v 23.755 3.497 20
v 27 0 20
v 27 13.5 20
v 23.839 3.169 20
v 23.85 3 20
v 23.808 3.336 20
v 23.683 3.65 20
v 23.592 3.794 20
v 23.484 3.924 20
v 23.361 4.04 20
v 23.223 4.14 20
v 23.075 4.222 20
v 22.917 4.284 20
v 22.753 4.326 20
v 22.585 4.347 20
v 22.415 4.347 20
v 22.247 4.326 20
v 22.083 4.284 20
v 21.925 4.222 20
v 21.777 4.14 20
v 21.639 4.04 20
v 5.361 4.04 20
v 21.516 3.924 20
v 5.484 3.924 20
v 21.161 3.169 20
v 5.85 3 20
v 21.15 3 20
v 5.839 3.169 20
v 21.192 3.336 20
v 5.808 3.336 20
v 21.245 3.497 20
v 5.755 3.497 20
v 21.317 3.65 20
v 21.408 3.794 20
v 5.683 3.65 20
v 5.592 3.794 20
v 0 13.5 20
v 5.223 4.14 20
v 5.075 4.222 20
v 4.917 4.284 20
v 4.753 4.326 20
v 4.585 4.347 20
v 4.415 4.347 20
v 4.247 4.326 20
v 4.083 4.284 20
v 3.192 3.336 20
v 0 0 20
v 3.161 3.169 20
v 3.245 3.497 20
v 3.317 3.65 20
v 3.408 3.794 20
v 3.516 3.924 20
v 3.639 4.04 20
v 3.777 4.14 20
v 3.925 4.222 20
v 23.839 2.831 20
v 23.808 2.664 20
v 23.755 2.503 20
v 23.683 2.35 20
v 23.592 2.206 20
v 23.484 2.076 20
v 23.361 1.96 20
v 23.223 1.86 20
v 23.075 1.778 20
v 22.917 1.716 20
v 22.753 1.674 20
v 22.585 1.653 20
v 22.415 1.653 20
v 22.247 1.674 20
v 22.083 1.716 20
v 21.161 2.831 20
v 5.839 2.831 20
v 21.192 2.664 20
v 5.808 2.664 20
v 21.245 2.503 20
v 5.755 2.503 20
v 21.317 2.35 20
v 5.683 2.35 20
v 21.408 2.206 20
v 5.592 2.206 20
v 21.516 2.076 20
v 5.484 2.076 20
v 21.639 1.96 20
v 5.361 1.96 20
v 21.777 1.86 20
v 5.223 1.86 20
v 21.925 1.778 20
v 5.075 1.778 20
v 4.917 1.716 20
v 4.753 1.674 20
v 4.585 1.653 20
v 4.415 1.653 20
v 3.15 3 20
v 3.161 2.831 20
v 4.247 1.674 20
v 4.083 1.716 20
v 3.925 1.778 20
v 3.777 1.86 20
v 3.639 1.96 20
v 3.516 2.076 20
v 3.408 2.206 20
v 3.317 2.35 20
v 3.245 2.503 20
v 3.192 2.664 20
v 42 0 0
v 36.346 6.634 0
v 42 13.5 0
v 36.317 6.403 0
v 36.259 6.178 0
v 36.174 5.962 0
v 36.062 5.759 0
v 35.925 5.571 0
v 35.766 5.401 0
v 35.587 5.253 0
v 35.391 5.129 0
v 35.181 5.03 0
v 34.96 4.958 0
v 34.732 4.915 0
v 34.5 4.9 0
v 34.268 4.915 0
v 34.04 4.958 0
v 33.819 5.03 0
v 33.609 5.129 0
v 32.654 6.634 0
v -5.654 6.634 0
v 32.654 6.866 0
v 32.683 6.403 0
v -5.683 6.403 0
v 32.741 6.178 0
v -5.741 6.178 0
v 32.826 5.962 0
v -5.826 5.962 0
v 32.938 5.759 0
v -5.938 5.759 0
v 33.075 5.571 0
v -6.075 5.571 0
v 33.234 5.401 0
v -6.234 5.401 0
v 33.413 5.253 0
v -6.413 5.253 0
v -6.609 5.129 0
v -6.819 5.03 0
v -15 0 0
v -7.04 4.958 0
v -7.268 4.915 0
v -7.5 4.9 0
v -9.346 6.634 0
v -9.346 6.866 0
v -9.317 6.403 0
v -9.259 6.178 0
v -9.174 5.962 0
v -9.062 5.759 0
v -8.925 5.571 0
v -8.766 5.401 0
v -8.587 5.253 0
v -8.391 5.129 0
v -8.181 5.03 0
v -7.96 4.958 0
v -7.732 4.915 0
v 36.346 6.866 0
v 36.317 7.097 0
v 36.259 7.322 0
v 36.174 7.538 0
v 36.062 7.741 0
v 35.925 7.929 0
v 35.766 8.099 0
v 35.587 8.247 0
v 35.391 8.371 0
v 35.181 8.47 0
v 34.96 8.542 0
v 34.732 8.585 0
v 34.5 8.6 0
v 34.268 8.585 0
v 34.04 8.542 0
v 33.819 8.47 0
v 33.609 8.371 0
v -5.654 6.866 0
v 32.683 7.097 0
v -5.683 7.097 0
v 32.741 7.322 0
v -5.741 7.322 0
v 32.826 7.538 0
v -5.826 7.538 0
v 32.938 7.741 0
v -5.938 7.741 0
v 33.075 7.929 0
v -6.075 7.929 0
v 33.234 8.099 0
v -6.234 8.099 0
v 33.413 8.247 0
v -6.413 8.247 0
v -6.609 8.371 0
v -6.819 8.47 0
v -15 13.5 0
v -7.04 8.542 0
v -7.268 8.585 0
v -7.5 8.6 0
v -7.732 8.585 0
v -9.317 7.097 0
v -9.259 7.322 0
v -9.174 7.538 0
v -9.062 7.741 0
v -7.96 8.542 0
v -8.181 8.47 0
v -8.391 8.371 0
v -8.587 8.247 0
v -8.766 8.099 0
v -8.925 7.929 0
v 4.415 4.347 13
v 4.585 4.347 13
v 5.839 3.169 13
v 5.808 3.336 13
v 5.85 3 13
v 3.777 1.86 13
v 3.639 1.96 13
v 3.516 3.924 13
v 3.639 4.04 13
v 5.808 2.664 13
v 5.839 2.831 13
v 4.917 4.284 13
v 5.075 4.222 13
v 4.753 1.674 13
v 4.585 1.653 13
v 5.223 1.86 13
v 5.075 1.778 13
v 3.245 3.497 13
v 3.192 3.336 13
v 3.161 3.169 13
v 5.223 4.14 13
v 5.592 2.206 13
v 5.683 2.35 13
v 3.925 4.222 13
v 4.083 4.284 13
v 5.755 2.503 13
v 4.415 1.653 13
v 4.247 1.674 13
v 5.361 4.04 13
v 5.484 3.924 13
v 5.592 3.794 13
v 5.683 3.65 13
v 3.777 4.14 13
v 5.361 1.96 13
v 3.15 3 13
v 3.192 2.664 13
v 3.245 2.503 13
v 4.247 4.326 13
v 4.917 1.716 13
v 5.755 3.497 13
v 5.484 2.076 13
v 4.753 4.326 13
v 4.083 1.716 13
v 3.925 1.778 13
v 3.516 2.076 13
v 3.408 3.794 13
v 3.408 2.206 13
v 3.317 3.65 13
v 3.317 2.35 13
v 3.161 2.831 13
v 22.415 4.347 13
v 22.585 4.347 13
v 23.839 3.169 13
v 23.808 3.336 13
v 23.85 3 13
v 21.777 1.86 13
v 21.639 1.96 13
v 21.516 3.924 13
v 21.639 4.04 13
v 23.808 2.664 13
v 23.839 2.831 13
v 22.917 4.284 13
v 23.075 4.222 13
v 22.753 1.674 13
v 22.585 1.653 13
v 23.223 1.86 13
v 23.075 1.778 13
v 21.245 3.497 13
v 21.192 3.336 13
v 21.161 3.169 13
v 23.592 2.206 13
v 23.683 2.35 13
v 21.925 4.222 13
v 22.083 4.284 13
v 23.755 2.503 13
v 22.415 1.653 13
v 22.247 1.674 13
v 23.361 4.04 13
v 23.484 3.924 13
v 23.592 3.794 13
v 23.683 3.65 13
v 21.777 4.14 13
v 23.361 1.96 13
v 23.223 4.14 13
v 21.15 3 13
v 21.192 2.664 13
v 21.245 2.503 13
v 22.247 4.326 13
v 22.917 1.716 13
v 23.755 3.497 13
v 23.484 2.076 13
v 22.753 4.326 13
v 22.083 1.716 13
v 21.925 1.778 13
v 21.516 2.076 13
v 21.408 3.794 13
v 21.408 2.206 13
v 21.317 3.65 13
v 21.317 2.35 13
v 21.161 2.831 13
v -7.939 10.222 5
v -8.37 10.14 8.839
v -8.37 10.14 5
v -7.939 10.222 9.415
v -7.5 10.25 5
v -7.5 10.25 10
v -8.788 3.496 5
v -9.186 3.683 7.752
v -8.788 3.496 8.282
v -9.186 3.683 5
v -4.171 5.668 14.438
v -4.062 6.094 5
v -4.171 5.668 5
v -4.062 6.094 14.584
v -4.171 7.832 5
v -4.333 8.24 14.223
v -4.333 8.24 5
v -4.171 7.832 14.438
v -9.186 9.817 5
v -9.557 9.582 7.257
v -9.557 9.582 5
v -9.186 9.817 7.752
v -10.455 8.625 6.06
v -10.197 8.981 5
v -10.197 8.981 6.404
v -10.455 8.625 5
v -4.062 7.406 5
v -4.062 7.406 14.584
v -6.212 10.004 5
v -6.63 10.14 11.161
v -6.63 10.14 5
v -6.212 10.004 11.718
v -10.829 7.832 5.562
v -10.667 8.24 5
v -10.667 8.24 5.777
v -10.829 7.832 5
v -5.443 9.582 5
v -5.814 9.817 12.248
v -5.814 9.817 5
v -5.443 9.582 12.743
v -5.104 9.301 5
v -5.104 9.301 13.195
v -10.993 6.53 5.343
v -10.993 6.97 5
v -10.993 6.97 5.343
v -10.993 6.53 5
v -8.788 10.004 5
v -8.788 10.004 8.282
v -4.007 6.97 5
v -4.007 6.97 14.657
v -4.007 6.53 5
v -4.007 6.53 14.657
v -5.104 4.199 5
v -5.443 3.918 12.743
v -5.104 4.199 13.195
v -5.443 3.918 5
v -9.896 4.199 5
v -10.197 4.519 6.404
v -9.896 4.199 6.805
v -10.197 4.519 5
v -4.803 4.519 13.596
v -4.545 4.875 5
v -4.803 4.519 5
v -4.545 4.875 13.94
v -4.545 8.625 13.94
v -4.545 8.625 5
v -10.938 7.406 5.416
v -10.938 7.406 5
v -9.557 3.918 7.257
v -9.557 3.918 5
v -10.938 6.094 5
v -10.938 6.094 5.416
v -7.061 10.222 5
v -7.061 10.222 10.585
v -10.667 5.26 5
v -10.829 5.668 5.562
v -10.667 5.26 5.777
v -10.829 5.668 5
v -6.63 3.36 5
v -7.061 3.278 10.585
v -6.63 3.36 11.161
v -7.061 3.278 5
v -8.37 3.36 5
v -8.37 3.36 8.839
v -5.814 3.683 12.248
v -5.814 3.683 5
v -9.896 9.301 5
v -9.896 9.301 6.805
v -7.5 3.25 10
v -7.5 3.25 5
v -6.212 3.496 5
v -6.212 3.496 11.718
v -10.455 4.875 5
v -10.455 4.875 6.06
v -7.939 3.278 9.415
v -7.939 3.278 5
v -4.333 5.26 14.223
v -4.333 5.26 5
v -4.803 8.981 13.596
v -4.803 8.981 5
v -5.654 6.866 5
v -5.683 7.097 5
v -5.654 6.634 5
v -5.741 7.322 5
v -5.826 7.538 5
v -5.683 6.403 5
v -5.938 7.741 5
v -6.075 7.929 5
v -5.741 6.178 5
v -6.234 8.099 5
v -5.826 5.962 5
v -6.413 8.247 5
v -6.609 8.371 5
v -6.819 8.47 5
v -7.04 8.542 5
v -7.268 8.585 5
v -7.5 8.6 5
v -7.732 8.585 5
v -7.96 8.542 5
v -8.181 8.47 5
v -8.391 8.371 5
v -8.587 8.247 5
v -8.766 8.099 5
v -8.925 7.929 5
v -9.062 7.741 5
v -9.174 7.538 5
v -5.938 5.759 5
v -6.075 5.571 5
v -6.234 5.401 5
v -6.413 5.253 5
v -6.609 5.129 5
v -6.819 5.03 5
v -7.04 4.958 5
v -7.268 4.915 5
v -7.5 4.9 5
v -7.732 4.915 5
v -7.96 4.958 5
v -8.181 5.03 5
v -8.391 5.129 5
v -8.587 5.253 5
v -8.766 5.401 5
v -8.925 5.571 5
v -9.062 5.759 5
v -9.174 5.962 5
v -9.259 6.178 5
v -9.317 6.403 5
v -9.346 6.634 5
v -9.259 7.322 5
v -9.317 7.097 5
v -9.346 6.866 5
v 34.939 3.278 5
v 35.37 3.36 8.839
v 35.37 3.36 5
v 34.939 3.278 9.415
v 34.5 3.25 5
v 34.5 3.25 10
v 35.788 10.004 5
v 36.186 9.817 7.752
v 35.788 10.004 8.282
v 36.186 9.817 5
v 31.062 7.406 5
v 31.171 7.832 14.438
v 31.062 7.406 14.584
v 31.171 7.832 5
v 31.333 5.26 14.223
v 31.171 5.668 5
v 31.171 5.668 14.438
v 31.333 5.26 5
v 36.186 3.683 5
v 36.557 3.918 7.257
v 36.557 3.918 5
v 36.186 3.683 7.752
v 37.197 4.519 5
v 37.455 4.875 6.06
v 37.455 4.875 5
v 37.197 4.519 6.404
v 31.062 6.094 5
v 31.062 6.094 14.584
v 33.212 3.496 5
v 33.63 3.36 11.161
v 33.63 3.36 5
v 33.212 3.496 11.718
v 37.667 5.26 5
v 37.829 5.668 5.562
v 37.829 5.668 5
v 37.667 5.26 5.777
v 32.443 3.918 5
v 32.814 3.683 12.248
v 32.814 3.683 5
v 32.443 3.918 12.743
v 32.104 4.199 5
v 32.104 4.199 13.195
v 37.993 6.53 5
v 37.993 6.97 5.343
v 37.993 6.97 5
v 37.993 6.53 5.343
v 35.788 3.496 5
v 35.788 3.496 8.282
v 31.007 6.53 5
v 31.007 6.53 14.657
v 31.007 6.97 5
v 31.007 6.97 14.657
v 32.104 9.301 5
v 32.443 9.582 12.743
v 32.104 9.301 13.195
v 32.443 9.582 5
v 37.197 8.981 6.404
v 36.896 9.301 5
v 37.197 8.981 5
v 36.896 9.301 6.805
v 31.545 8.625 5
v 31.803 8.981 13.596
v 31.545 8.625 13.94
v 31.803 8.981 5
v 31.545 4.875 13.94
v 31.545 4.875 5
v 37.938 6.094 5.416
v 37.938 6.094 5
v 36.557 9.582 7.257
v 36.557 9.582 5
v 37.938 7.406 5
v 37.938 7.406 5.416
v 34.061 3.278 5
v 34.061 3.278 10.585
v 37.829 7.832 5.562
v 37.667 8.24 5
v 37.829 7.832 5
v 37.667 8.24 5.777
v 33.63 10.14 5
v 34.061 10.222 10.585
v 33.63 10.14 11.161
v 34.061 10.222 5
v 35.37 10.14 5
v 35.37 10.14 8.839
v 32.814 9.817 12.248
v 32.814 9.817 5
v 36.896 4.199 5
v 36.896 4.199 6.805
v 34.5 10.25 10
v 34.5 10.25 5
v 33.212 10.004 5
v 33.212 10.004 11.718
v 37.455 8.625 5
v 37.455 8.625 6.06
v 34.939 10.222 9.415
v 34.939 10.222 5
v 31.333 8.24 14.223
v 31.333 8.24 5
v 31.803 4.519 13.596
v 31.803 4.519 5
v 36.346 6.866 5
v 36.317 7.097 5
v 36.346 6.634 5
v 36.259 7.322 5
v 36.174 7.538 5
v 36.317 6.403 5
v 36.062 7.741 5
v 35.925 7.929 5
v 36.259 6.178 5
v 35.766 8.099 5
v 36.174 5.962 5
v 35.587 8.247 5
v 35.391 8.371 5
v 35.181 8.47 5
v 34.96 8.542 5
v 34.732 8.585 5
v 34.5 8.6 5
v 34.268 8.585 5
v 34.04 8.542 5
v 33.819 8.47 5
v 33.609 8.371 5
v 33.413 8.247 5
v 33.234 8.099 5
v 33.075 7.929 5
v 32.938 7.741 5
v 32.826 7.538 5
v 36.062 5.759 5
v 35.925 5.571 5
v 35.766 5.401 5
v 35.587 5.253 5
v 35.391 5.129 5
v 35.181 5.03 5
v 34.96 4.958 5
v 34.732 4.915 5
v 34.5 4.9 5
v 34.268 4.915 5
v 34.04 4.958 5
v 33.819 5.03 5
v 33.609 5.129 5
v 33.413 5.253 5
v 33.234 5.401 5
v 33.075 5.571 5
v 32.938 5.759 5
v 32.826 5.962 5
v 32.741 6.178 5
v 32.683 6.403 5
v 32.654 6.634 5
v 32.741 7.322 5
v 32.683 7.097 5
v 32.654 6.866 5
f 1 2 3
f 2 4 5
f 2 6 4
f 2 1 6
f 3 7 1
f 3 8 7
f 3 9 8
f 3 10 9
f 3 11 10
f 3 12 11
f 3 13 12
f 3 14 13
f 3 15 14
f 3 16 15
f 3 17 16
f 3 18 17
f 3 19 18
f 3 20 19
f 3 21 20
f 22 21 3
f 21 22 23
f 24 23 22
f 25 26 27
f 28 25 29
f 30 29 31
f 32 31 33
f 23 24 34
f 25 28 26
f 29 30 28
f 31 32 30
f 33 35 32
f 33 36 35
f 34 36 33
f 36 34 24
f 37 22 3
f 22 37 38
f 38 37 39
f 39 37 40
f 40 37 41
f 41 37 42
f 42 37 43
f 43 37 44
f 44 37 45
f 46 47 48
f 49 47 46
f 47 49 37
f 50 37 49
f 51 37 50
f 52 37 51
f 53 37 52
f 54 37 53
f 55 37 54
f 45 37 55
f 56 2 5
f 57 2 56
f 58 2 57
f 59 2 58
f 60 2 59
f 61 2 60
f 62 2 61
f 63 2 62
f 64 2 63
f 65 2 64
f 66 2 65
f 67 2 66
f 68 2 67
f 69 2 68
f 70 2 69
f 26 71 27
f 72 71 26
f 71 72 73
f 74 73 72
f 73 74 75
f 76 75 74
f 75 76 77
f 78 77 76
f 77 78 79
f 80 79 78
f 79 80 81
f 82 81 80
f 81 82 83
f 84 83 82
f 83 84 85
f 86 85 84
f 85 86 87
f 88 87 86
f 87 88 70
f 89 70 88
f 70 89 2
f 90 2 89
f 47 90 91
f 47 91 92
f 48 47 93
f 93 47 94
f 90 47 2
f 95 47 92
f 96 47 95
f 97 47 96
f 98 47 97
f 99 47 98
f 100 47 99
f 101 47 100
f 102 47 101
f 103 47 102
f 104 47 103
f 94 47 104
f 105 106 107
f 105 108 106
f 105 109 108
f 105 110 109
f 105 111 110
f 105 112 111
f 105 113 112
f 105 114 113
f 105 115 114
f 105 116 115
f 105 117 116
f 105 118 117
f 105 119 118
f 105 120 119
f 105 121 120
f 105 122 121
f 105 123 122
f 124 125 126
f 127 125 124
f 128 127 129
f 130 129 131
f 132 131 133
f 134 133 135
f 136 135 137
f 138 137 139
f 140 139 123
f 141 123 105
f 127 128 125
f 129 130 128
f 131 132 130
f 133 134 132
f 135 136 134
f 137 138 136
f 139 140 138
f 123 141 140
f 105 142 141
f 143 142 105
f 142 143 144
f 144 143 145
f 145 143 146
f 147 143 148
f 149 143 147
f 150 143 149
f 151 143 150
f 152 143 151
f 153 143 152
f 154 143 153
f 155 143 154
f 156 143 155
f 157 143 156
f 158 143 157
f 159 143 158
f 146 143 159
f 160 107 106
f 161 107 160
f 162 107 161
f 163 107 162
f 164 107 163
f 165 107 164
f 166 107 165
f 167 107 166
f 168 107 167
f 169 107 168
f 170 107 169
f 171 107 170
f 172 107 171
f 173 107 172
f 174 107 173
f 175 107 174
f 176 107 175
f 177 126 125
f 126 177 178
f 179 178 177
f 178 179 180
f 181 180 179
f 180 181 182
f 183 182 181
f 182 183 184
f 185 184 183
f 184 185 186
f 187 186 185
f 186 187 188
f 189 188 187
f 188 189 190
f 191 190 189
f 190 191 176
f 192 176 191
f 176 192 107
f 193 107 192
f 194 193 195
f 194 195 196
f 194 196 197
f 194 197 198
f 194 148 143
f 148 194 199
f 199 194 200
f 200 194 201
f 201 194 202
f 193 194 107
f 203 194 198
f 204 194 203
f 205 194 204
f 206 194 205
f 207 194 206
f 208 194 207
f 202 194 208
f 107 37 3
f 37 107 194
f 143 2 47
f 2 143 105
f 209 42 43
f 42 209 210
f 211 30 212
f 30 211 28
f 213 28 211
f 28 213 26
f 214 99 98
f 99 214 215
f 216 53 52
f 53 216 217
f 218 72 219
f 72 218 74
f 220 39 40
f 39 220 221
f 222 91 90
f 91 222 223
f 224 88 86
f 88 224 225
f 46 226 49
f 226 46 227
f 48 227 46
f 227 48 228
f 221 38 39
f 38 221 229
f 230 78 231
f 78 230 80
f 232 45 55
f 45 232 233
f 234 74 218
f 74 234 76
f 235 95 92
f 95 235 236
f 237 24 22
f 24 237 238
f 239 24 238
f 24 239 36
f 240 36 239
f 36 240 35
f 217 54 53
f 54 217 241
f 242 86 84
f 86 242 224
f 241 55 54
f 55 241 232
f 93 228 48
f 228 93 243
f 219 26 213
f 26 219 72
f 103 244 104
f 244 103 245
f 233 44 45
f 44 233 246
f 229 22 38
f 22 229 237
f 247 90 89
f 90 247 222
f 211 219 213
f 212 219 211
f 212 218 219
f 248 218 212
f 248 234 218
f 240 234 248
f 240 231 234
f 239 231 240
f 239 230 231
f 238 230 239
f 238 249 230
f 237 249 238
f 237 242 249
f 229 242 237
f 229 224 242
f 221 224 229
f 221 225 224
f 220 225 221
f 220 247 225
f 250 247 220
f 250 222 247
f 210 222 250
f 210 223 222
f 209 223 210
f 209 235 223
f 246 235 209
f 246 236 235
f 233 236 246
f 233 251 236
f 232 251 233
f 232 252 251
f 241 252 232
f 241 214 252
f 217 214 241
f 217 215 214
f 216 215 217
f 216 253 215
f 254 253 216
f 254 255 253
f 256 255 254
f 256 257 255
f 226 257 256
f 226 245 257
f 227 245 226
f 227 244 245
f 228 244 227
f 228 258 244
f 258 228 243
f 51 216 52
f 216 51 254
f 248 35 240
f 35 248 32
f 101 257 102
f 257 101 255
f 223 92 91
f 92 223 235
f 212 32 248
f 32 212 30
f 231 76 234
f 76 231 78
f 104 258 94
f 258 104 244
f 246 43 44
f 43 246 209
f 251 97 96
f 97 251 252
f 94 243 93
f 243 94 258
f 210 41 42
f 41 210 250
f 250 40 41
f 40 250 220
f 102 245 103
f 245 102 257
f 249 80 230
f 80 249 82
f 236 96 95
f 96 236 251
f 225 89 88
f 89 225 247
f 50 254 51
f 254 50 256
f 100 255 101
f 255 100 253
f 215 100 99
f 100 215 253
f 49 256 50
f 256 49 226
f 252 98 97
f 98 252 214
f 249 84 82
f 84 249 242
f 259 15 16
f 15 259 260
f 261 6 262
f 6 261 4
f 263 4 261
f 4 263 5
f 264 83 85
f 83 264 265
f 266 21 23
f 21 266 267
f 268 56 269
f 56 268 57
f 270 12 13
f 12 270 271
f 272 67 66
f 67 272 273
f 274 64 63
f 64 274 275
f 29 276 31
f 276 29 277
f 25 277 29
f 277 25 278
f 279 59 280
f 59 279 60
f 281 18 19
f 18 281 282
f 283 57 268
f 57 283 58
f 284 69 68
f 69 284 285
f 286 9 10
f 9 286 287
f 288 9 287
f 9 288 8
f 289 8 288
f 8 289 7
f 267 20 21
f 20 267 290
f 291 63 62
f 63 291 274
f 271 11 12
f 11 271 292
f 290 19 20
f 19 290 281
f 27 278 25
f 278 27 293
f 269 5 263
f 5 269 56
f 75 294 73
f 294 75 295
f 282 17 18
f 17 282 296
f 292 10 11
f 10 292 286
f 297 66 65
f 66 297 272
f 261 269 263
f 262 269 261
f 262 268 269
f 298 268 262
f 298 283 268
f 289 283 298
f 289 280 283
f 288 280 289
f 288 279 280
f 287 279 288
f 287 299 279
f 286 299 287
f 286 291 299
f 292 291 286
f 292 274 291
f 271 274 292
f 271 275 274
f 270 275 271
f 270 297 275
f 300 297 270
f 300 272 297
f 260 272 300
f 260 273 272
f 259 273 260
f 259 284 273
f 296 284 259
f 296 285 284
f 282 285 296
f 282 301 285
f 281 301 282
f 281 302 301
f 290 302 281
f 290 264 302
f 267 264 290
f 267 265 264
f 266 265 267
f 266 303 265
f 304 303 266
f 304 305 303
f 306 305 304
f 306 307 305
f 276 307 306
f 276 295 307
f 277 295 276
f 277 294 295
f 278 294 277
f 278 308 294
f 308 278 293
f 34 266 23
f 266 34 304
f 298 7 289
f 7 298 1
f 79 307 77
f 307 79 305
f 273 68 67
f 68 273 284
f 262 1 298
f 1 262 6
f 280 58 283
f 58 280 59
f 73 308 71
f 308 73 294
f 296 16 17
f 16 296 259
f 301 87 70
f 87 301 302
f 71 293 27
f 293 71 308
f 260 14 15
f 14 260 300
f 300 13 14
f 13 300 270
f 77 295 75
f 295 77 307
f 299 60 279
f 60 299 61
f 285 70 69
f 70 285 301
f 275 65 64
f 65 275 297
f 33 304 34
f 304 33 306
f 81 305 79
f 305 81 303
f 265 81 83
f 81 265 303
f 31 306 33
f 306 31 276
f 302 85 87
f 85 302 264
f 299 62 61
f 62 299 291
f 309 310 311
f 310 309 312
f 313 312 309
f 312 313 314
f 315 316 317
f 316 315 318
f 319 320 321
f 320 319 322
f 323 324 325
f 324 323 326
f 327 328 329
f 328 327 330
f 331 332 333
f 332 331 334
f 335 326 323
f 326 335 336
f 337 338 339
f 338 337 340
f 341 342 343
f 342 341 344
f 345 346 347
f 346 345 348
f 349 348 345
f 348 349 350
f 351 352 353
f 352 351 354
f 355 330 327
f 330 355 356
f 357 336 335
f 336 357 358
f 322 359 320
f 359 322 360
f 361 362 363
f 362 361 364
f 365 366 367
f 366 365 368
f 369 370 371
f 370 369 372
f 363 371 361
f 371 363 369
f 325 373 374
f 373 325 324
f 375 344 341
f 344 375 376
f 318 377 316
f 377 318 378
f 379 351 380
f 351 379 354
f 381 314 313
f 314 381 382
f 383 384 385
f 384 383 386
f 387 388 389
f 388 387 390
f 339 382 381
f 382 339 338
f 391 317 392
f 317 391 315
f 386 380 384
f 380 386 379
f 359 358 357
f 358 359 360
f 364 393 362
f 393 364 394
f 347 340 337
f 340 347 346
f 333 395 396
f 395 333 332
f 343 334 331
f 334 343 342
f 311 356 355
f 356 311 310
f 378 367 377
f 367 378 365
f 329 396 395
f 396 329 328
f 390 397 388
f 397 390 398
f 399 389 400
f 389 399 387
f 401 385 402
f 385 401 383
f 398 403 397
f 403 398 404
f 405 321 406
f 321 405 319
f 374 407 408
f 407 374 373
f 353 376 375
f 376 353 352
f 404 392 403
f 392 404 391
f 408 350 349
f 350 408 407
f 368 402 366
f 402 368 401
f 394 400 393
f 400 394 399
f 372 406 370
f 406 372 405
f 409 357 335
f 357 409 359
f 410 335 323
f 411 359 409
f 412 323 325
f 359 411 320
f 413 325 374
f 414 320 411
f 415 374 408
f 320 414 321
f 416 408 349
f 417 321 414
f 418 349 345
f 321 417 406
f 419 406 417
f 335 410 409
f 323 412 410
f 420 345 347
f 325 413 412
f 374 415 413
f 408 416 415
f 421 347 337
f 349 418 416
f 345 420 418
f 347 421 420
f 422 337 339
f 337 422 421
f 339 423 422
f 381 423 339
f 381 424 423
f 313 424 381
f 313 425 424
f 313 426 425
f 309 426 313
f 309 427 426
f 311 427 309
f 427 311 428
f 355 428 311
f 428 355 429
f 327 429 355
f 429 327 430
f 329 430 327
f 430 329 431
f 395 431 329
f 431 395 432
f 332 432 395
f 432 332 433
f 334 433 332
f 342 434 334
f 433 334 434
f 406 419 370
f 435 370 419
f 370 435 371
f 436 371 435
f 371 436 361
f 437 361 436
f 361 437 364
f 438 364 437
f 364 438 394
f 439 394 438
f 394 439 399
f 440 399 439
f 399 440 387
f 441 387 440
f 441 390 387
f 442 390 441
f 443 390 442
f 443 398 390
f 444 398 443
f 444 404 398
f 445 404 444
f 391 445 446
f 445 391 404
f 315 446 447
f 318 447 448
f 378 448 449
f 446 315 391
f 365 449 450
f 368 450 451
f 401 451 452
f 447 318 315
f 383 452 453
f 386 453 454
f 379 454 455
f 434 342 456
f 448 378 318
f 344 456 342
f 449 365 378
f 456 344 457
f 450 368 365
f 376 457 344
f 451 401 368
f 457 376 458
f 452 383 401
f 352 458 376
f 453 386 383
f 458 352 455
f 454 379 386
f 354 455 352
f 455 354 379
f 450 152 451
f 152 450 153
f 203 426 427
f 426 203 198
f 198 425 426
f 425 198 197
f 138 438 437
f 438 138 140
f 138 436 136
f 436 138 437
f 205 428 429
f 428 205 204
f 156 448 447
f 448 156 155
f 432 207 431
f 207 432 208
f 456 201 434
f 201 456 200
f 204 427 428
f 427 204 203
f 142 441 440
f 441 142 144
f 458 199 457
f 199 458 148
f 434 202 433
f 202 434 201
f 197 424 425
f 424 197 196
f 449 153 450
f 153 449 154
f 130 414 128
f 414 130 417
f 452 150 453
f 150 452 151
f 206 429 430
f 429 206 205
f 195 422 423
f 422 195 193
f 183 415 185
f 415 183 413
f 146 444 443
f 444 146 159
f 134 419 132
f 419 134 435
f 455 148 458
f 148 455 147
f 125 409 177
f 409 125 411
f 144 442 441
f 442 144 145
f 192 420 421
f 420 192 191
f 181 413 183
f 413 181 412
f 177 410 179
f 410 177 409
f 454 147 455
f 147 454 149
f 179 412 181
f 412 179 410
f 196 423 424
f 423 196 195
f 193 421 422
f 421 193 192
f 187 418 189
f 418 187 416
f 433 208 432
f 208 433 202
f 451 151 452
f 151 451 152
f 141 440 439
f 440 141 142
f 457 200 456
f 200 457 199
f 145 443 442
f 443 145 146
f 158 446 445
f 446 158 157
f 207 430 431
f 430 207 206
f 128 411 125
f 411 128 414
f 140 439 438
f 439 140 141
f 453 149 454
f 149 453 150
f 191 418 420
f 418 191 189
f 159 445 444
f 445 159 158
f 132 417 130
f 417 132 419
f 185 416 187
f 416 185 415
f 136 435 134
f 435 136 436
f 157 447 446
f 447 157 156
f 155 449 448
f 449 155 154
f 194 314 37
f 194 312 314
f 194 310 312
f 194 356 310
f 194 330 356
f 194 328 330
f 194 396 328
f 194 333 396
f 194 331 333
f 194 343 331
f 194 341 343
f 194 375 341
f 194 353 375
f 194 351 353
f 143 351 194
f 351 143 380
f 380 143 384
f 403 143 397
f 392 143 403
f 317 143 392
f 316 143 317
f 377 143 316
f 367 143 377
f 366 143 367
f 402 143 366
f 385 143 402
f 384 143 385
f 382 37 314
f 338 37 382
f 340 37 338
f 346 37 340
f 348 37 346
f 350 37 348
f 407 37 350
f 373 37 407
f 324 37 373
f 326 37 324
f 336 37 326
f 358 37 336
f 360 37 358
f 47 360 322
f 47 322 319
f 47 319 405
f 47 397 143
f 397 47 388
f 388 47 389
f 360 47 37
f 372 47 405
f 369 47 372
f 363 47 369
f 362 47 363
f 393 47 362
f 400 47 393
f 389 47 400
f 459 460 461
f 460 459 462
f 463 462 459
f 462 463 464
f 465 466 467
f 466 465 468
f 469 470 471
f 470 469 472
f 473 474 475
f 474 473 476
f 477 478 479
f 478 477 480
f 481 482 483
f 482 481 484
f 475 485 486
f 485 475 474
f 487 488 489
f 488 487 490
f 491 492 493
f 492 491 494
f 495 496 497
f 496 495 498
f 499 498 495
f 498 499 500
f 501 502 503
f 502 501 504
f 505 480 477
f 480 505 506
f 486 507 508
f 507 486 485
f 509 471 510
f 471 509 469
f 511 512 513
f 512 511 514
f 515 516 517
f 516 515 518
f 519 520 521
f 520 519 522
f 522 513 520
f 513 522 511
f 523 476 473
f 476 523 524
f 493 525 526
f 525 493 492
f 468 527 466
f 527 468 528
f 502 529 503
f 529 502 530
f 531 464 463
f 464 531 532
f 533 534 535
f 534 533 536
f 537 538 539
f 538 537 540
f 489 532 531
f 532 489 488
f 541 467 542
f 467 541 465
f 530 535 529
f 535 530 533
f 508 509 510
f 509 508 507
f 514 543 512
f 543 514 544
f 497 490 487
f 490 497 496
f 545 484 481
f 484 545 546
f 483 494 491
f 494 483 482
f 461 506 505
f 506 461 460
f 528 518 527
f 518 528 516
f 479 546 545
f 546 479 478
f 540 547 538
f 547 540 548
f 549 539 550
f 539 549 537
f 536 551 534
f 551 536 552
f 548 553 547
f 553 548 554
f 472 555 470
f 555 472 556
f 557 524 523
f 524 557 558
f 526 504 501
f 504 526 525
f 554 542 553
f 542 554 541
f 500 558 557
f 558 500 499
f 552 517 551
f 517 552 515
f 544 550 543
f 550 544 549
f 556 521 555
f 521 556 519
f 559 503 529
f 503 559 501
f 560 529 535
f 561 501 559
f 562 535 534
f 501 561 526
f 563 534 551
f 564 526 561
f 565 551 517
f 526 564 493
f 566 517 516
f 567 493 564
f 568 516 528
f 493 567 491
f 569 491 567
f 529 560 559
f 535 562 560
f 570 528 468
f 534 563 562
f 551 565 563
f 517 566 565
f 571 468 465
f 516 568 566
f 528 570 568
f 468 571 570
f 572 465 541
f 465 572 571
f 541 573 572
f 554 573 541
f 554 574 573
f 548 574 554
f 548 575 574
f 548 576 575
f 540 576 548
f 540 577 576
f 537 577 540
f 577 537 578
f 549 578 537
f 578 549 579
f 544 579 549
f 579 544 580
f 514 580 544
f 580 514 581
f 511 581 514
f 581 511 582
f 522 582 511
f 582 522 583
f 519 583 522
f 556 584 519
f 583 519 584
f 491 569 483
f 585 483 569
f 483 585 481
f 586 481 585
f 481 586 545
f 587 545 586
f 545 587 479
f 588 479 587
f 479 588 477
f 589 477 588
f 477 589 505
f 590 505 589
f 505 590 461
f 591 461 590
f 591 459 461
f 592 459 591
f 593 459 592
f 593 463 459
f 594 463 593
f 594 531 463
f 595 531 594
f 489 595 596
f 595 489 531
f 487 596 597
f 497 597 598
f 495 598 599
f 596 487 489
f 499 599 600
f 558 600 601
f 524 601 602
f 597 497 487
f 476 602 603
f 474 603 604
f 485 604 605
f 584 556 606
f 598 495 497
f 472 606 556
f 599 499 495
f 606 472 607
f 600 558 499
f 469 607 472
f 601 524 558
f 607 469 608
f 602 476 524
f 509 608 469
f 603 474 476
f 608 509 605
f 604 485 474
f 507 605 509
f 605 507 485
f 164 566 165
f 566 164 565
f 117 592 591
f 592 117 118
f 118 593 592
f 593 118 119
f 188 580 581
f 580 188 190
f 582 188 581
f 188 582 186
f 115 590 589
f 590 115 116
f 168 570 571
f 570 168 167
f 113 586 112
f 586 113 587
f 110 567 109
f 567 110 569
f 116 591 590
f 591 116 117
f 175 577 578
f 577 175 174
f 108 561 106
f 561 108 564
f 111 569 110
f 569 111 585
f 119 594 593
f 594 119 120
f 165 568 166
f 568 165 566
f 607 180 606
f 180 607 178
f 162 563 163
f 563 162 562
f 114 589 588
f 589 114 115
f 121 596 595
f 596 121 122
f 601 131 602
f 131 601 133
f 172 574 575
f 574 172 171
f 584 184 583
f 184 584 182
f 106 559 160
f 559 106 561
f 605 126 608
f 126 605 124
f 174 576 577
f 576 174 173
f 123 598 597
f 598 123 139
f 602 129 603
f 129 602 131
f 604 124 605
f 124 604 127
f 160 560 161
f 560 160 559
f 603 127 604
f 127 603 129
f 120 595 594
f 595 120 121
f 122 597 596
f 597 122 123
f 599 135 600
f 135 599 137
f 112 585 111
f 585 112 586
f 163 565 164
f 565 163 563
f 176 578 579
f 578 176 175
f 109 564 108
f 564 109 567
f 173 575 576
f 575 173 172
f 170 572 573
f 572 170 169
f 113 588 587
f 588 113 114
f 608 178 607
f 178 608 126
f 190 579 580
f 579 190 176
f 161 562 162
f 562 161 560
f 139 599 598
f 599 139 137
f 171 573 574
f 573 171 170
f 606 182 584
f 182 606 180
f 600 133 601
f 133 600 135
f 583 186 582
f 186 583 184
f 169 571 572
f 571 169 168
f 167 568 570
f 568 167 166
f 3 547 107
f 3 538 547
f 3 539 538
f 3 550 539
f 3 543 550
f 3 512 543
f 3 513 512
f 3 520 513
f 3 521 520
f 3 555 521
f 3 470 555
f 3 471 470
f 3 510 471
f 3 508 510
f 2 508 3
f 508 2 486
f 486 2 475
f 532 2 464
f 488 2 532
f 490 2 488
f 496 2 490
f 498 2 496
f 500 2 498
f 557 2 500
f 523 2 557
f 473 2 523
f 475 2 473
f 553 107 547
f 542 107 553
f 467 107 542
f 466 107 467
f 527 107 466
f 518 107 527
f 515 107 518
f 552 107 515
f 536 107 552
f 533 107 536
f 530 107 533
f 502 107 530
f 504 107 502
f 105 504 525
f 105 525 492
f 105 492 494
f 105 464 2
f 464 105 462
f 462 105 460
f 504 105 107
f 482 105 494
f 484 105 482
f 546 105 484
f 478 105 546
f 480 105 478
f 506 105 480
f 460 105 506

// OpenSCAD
// file: screw_holes.scad
// Holes for old screws (2.5 x 16mm) that fit into the old opening rod
module old_hole(bottom_thickness, bracket_height) {
  translate([0, 0, bottom_thickness]) cylinder(d=6.3, h=bracket_height + 1); // Top portion of screw
  translate([0, 0, -1]) cylinder(d=3.2, h=bracket_height + 1); // Threaded part of screw
}

// Holes for 6x½ screws
module six_hole(bottom_thickness, bracket_height) {
  translate([0, 0, bottom_thickness]) cylinder(d=7, h=bracket_height + 1); // Top portion of screw
  translate([0, 0, -1]) cylinder(d=3.7, h=bracket_height + 1); // Threaded portion of screw
}

// Hole for M3 screws to pass through in cover and lid
module m3_hole(wall_thickness=5) {
  cylinder(h=wall_thickness + 2, d=3.4);
}

// Hole for M3 brass screw inserts
module m3_insert_hole() {
  cylinder(h=5.5 + 1, d=4.4);
}

// Hole for M2 brass screw inserts
module m2_insert_hole() {
  cylinder(h=2.7 + 1, d=3.1);
}

// Hole for reed switch screws
module reed_hole() {
  cylinder(h=7 + 1, d=2.7);
}

// Hole for the servo cable connector
module servo_hole(wall_thickness=5) {
  cylinder(h=wall_thickness + 2, d=8.5);
}

module cable_hole(dimensions) {
  difference() {
    cube(dimensions);

    // Cable hole
    translate([dimensions.x / 2, 0, dimensions.z / 2]) {
      translate([0, dimensions.y + 1.6, 0]) rotate([90, 0, 0]) cylinder(h=dimensions.y, d=28);
      translate([0, 1.6 + 1, 0]) rotate([90, 0, 0]) cylinder(h=1.6 + 2, d=26);
    }
  }
}
// file: mounting_bracket.scad
use <screw_holes.scad>

// Mounting bracket, used for door opener, switch panel and pico case
module mounting_bracket(dimensions, bottom_spacing) {
    bracket_points = [
      [0, 0],
      [-dimensions.z, 0],
      [0, dimensions.y]
    ];

    difference() {
      rotate([0, 90, 0]) linear_extrude(height=dimensions.x) polygon(bracket_points);
      translate([dimensions.x / 2, dimensions.y / 2, 0]) six_hole(bottom_spacing, dimensions.z);
    }
}
// main file
use <mounting_bracket.scad>
use <screw_holes.scad>

// These values can be changed within the OpenSCAD customiser
// Determines whether to render a taller (20mm) or shorter (14mm) height mounting block for the reed switch
short = false;
// The height of a tall mounting block
tall_height = 20;
// The height of a short mounting block
short_height = 14;

module reed_switch_mount(short) {
  $fn = 50;

  // Render a shorter reed switch mount for the right hand side of the door, since that is higher
  if(short) {
    reed_switch_mount_helper(short_height);
  } else {
    reed_switch_mount_helper(tall_height);
  }
}

module reed_switch_mount_helper(door_height) {
  main_body = [27, 13.5, door_height];
  mounting_bracket = [13.5, 15, door_height]; 

  // Main body
  difference() {
    cube(main_body);
    translate([4.5, 3, main_body.z - 7]) reed_hole();
    translate([main_body.x - 4.5, 3, main_body.z - 7]) reed_hole();
  }

  // Mounting brackets
  rotate([0, 0, 90]) mounting_bracket(mounting_bracket, 5);
  translate([main_body.x, mounting_bracket.x, 0]) rotate([0, 0, -90]) mounting_bracket(mounting_bracket, 5);
}

reed_switch_mount(short);
